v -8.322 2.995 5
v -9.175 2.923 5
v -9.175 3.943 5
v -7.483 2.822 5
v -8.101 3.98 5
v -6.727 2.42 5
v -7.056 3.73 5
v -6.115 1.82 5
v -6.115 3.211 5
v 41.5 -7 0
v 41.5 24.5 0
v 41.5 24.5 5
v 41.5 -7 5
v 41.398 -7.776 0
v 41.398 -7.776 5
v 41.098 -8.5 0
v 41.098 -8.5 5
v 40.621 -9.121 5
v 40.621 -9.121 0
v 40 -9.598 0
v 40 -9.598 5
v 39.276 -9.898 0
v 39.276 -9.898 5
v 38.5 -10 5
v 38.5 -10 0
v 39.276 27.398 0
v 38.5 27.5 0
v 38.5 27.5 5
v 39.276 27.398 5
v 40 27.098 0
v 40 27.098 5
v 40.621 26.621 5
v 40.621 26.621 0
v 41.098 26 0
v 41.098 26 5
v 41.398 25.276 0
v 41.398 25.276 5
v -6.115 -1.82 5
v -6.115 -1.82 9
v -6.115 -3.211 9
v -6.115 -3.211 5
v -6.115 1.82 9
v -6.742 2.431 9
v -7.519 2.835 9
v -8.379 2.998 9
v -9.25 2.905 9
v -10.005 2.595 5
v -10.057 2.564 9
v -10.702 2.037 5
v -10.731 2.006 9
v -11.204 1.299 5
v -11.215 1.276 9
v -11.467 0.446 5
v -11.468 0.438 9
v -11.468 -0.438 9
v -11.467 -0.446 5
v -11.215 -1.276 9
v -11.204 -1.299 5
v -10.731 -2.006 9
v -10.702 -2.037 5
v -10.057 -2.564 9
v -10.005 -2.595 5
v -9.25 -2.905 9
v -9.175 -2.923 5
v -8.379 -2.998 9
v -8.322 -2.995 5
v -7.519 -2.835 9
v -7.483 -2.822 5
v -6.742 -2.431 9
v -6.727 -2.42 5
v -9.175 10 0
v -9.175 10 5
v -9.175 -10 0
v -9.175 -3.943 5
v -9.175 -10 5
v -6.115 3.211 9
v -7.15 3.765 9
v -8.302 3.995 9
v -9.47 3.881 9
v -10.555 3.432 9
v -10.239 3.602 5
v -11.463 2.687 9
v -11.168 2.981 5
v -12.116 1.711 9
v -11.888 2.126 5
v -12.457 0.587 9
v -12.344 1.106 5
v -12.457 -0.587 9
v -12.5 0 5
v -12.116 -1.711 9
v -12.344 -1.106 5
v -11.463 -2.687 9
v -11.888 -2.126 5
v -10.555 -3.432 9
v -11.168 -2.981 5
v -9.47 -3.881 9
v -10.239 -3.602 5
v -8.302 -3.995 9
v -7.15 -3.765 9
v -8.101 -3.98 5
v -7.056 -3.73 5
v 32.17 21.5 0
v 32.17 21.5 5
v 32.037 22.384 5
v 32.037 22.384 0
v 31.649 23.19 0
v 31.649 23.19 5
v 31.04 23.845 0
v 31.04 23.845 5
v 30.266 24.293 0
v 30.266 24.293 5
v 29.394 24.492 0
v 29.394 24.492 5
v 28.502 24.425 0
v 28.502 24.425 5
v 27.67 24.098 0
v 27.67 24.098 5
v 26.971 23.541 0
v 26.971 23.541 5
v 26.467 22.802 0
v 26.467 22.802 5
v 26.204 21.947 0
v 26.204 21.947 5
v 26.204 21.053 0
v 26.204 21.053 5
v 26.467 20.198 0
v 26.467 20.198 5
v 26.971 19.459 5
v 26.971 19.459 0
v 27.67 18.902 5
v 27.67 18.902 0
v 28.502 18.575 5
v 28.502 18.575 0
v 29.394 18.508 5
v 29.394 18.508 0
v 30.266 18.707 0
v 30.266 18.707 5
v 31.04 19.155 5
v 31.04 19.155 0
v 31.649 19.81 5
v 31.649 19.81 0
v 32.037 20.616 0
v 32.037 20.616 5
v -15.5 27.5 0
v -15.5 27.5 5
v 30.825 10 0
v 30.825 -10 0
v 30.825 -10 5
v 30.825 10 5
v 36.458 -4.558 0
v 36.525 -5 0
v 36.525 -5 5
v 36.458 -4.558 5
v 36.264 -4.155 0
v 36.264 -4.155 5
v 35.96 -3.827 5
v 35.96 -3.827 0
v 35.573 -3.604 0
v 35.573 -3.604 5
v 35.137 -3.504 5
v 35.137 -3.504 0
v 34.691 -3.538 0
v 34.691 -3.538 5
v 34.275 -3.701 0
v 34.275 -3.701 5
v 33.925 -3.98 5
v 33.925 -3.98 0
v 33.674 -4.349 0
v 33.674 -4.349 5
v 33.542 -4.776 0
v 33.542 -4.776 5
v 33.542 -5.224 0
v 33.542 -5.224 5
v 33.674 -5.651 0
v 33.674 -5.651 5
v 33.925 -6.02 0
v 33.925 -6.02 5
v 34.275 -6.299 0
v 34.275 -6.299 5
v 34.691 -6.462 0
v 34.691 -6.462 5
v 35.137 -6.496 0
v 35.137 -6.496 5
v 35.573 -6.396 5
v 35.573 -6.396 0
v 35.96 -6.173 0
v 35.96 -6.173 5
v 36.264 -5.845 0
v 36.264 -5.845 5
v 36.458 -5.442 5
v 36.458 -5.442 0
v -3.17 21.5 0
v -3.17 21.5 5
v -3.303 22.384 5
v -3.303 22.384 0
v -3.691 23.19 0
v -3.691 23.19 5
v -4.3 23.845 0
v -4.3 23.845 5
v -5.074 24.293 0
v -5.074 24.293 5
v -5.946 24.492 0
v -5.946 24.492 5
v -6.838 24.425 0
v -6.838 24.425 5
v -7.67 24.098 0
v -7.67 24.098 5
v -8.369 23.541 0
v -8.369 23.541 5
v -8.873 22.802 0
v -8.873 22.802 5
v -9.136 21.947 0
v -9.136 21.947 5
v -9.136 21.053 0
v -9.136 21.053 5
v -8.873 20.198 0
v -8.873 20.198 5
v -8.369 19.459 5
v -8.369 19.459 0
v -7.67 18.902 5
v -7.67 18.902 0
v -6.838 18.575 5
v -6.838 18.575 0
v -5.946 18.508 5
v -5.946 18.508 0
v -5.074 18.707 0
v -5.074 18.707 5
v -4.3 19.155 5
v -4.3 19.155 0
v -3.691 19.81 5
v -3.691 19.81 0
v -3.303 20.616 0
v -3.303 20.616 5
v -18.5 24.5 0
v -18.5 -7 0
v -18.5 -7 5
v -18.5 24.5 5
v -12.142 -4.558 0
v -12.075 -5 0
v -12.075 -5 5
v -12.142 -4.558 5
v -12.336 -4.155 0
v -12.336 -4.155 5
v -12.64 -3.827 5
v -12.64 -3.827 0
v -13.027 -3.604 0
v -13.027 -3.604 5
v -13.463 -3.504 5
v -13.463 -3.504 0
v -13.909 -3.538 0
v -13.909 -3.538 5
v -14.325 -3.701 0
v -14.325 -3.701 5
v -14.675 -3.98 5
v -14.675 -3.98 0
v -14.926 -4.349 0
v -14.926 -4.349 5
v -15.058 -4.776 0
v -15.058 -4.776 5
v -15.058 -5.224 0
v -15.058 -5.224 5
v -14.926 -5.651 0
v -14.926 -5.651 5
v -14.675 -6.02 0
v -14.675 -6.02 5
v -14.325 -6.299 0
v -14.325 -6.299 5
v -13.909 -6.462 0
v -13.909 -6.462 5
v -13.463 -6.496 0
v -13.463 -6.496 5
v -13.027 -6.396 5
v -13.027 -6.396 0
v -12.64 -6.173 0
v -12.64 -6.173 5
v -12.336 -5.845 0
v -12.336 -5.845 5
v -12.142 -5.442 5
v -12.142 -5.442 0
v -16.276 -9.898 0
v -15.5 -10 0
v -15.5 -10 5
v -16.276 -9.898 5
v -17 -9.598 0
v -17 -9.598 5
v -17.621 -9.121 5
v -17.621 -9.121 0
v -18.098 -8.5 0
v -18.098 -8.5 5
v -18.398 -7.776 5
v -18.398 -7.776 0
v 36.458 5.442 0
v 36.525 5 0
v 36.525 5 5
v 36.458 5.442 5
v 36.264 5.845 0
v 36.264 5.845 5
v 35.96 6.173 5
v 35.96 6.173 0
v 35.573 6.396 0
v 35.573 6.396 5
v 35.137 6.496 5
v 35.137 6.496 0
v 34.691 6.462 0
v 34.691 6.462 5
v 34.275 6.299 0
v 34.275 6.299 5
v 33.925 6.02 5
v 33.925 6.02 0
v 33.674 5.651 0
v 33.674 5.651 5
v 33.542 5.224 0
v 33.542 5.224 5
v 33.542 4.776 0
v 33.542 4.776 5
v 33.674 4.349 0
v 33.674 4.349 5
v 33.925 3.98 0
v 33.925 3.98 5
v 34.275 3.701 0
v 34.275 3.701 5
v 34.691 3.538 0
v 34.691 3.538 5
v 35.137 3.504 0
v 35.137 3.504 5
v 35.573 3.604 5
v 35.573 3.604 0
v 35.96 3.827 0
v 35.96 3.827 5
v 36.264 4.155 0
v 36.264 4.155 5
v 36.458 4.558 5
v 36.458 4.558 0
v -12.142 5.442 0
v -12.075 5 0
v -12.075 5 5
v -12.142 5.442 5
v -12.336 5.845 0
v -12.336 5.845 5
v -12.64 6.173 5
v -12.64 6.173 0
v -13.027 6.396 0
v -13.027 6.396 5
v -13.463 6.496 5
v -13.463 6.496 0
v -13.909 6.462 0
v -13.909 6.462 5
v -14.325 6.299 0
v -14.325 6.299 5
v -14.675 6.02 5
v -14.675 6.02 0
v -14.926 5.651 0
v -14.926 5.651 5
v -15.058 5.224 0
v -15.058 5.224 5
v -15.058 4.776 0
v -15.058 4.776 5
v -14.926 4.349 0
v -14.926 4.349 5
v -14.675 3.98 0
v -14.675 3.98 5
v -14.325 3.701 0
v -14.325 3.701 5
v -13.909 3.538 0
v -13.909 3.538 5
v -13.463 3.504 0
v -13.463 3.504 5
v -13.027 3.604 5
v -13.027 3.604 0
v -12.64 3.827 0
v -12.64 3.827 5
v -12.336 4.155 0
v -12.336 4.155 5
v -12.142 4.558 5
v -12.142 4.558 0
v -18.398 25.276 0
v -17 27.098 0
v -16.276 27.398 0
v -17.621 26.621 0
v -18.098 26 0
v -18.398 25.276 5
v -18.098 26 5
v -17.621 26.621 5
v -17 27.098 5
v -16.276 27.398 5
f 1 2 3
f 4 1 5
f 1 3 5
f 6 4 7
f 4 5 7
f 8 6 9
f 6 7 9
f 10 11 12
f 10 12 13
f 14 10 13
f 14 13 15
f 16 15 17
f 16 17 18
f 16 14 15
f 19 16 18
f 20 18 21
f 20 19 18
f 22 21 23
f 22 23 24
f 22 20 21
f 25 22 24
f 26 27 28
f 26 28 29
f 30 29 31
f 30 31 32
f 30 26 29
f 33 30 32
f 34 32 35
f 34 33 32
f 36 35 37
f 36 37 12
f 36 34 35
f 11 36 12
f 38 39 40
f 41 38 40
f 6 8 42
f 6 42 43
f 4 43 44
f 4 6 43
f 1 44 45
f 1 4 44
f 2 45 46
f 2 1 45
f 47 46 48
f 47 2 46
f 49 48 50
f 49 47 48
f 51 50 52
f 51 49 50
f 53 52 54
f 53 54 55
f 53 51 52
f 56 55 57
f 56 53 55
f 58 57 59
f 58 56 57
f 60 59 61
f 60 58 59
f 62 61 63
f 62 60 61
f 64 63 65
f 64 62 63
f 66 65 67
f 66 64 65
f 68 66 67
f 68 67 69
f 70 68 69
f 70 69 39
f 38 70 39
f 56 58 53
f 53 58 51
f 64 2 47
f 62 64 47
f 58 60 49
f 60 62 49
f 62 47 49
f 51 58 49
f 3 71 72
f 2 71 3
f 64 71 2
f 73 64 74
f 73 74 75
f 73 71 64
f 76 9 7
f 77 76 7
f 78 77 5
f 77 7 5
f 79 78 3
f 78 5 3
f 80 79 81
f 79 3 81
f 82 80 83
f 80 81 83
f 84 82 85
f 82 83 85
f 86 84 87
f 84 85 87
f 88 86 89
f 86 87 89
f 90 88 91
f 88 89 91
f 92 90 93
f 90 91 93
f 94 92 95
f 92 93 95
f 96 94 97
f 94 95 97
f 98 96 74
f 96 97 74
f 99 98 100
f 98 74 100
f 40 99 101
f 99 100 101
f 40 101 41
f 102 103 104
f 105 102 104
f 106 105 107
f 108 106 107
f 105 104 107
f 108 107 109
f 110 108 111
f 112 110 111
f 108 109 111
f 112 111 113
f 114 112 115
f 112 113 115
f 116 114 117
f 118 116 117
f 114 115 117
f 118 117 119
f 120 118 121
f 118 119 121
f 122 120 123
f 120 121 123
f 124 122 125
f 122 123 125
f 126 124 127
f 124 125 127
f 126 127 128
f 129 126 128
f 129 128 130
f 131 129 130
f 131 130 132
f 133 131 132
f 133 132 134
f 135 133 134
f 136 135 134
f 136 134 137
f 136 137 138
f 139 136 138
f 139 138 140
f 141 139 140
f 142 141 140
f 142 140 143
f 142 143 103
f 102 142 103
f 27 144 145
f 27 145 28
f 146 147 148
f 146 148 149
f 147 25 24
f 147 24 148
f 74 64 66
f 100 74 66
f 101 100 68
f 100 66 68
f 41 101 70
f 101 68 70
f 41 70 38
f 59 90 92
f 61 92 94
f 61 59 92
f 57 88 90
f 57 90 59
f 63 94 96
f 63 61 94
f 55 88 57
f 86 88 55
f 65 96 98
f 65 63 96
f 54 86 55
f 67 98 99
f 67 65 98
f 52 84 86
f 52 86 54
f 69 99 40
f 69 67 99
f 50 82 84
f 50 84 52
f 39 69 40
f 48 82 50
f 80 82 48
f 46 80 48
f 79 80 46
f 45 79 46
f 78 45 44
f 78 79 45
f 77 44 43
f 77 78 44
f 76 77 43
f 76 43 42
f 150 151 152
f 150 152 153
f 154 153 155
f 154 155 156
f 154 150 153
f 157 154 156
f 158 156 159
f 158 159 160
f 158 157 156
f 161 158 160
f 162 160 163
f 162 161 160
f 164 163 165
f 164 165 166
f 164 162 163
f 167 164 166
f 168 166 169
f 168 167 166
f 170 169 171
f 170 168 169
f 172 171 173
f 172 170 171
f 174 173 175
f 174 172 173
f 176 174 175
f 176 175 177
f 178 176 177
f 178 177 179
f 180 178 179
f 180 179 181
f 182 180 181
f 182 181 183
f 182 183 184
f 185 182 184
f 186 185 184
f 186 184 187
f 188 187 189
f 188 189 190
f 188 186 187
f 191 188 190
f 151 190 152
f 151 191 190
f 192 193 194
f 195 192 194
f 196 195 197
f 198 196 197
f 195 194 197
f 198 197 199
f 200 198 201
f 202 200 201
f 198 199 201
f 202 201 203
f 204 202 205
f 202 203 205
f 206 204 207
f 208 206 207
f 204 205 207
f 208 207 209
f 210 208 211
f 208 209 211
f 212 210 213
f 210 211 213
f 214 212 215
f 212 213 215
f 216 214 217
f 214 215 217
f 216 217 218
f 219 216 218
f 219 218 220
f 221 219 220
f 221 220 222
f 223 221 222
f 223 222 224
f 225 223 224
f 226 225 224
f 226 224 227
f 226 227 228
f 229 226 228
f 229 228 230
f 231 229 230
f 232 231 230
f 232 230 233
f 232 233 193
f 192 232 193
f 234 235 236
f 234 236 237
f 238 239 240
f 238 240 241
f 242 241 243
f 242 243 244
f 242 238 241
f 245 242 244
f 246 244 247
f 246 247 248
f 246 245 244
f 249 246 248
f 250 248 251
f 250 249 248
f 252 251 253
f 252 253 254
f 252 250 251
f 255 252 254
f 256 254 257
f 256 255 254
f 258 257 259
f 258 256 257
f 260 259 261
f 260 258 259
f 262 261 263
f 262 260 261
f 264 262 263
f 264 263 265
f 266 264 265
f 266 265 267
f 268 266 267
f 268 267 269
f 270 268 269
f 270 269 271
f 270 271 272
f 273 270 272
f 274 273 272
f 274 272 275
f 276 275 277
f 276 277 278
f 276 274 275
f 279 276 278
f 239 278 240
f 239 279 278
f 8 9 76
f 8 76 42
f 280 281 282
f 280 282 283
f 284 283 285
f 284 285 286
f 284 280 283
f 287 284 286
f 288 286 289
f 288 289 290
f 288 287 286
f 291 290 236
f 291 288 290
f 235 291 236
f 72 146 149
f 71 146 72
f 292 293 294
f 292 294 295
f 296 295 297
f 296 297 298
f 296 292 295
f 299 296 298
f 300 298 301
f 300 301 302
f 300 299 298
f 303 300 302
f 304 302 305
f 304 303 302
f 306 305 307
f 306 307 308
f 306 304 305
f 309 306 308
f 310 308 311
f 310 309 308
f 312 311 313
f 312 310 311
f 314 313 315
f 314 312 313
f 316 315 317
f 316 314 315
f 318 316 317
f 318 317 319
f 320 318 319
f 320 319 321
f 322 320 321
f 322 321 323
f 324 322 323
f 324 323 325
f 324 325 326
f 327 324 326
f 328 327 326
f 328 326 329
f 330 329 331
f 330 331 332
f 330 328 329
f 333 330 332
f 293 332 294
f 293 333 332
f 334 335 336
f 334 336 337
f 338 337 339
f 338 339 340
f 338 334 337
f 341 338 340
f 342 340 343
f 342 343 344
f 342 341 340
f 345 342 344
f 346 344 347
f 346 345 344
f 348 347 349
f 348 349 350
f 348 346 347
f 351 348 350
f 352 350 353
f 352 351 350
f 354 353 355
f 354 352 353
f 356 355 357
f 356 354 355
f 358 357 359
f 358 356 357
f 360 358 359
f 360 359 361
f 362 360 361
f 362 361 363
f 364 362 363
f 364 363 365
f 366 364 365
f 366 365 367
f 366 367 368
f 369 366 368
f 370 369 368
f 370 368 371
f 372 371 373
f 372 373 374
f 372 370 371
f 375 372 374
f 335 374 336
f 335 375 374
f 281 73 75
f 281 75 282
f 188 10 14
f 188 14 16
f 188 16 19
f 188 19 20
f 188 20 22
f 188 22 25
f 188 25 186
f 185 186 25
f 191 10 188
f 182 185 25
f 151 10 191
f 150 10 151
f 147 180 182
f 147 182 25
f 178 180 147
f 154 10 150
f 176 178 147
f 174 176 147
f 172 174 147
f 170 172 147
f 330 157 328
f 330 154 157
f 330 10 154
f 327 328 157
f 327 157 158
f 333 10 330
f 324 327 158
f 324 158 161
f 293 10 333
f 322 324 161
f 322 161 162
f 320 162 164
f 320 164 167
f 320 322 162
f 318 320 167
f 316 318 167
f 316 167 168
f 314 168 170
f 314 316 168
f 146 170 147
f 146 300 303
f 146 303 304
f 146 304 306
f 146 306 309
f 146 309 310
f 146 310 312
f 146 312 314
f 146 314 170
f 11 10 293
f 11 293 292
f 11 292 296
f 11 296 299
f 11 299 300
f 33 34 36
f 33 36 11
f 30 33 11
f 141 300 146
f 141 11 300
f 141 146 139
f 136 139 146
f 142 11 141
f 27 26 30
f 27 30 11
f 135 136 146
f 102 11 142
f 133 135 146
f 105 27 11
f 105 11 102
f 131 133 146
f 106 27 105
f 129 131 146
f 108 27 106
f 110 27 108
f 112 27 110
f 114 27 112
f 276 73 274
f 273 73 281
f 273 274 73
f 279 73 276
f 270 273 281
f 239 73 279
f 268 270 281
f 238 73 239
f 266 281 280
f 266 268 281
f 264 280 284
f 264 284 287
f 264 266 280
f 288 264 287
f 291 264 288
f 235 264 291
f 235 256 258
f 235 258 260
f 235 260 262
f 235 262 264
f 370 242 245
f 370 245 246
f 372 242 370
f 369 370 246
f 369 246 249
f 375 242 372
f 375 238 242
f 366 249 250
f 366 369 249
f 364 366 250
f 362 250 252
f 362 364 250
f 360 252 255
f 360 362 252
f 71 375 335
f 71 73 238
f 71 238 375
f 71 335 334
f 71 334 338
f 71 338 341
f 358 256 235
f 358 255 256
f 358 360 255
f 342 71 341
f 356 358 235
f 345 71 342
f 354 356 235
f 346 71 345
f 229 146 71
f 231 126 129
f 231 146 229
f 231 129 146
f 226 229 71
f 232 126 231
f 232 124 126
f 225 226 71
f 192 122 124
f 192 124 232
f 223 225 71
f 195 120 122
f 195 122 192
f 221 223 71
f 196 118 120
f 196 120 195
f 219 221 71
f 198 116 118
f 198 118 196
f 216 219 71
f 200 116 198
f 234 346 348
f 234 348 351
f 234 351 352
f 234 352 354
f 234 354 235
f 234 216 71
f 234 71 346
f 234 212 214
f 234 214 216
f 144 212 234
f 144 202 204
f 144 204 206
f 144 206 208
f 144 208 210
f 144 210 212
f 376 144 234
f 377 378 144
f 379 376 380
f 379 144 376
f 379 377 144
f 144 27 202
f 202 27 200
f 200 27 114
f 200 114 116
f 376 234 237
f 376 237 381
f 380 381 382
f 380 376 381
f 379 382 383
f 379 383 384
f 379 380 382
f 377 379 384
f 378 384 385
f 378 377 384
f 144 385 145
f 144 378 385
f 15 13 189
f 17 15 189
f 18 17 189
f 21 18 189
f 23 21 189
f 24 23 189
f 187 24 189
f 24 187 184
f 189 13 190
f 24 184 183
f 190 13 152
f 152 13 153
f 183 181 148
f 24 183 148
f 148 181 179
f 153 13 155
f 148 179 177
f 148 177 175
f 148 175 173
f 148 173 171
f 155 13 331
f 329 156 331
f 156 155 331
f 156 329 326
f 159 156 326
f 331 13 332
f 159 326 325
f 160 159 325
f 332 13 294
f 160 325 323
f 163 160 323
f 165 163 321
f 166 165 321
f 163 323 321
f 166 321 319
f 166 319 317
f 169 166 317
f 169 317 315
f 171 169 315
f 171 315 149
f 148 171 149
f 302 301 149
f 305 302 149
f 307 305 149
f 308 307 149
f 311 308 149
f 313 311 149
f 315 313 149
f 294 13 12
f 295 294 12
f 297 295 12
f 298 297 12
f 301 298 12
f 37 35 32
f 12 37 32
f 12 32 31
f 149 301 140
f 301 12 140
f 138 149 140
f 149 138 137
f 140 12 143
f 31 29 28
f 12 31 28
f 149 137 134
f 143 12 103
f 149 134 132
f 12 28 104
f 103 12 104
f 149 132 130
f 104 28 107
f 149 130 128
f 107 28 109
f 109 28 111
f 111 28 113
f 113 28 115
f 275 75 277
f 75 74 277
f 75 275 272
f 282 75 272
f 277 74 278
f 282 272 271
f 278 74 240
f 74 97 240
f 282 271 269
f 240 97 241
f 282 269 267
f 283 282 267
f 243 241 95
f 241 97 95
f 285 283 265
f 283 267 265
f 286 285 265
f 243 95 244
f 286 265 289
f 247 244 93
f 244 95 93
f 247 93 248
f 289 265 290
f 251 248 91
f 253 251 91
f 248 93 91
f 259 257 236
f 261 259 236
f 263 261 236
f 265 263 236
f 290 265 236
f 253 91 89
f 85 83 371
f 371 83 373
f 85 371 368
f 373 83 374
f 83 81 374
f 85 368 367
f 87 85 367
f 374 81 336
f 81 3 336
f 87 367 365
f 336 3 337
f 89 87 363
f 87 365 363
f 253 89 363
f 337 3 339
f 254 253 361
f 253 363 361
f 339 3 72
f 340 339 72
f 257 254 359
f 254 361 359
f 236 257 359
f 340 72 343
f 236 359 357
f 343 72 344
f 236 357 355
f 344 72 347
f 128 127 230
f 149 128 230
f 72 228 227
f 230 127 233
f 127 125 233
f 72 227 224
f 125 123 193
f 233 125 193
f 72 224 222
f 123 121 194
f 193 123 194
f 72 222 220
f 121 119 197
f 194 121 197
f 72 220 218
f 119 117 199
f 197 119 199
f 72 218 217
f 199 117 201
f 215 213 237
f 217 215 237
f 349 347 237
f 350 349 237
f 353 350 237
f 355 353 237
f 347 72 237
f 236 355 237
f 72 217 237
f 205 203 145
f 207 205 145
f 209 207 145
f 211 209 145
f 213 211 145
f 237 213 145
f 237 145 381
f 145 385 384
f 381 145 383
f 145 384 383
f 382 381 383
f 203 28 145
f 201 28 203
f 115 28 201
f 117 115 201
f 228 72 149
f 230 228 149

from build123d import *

# Parameters (mm, degrees)
SKETCH_1_R          = 1.5
EXTRUDE_1_DEPTH     = 5
SKETCH_2_R          = 3
CUT_EXTRUDE_1_DEPTH = 10
SKETCH_3_R          = 4
SKETCH_3_R_2        = 3
EXTRUDE_1_2_DEPTH   = 4
CUT_EXTRUDE_START   = -4
CUT_EXTRUDE_2_DEPTH = 4


with BuildPart() as part:
    # 草图1 → Extrude 1 (new body)
    with BuildSketch(Plane.XY):
        with BuildLine():
            Line((-15.5, 27.5), (38.5, 27.5))
            ThreePointArc((38.5, 27.5), (40.621320344, 26.621320344), (41.5, 24.5))
            Line((41.5, 24.5), (41.5, -7))
            ThreePointArc((41.5, -7), (40.621320344, -9.121320344), (38.5, -10))
            Line((38.5, -10), (33.3, -10))
            Line((33.3, -10), (30.825, -10))
            Line((30.825, -10), (30.825, 10))
            Line((30.825, 10), (-9.175, 10))
            Line((-9.175, 10), (-9.175, -10))
            Line((-9.175, -10), (-15.5, -10))
            ThreePointArc((-15.5, -10), (-17.621320344, -9.121320344), (-18.5, -7))
            Line((-18.5, -7), (-18.5, 24.5))
            ThreePointArc((-18.5, 24.5), (-17.621320344, 26.621320344), (-15.5, 27.5))
        make_face()
        with Locations((-13.575, 5)):
            Circle(SKETCH_1_R, mode=Mode.SUBTRACT)
        with Locations((-13.575, -5)):
            Circle(SKETCH_1_R, mode=Mode.SUBTRACT)
        with Locations((35.025, 5)):
            Circle(SKETCH_1_R, mode=Mode.SUBTRACT)
        with Locations((35.025, -5)):
            Circle(SKETCH_1_R, mode=Mode.SUBTRACT)
    extrude(amount=EXTRUDE_1_DEPTH)

    # 草图2 → 切除-拉伸1 (cut)
    with BuildSketch(Plane.XY.offset(5)):
        with Locations((-6.17, 21.5)):
            Circle(SKETCH_2_R)
        with Locations((29.17, 21.5)):
            Circle(SKETCH_2_R)
    extrude(amount=-CUT_EXTRUDE_1_DEPTH, mode=Mode.SUBTRACT)

    # 草图3 → Extrude 1 2 (add)
    with BuildSketch(Plane.XY.offset(5)):
        with Locations((-8.5, 0)):
            Circle(SKETCH_3_R)
        with Locations((-8.5, 0)):
            Circle(SKETCH_3_R_2, mode=Mode.SUBTRACT)
    extrude(amount=EXTRUDE_1_2_DEPTH)

    # 草图5 → 切除-拉伸2 (cut)
    with BuildSketch(Plane.XY.offset(9).offset(CUT_EXTRUDE_START)):
        with BuildLine():
            Line((-6.115117964, 3.211282871), (-6.115117964, -3.211282871))
            ThreePointArc((-6.115117964, -3.211282871), (-4.5, 0), (-6.115117964, 3.211282871))
        make_face()
    extrude(amount=CUT_EXTRUDE_2_DEPTH, mode=Mode.SUBTRACT)


solid = part.part
